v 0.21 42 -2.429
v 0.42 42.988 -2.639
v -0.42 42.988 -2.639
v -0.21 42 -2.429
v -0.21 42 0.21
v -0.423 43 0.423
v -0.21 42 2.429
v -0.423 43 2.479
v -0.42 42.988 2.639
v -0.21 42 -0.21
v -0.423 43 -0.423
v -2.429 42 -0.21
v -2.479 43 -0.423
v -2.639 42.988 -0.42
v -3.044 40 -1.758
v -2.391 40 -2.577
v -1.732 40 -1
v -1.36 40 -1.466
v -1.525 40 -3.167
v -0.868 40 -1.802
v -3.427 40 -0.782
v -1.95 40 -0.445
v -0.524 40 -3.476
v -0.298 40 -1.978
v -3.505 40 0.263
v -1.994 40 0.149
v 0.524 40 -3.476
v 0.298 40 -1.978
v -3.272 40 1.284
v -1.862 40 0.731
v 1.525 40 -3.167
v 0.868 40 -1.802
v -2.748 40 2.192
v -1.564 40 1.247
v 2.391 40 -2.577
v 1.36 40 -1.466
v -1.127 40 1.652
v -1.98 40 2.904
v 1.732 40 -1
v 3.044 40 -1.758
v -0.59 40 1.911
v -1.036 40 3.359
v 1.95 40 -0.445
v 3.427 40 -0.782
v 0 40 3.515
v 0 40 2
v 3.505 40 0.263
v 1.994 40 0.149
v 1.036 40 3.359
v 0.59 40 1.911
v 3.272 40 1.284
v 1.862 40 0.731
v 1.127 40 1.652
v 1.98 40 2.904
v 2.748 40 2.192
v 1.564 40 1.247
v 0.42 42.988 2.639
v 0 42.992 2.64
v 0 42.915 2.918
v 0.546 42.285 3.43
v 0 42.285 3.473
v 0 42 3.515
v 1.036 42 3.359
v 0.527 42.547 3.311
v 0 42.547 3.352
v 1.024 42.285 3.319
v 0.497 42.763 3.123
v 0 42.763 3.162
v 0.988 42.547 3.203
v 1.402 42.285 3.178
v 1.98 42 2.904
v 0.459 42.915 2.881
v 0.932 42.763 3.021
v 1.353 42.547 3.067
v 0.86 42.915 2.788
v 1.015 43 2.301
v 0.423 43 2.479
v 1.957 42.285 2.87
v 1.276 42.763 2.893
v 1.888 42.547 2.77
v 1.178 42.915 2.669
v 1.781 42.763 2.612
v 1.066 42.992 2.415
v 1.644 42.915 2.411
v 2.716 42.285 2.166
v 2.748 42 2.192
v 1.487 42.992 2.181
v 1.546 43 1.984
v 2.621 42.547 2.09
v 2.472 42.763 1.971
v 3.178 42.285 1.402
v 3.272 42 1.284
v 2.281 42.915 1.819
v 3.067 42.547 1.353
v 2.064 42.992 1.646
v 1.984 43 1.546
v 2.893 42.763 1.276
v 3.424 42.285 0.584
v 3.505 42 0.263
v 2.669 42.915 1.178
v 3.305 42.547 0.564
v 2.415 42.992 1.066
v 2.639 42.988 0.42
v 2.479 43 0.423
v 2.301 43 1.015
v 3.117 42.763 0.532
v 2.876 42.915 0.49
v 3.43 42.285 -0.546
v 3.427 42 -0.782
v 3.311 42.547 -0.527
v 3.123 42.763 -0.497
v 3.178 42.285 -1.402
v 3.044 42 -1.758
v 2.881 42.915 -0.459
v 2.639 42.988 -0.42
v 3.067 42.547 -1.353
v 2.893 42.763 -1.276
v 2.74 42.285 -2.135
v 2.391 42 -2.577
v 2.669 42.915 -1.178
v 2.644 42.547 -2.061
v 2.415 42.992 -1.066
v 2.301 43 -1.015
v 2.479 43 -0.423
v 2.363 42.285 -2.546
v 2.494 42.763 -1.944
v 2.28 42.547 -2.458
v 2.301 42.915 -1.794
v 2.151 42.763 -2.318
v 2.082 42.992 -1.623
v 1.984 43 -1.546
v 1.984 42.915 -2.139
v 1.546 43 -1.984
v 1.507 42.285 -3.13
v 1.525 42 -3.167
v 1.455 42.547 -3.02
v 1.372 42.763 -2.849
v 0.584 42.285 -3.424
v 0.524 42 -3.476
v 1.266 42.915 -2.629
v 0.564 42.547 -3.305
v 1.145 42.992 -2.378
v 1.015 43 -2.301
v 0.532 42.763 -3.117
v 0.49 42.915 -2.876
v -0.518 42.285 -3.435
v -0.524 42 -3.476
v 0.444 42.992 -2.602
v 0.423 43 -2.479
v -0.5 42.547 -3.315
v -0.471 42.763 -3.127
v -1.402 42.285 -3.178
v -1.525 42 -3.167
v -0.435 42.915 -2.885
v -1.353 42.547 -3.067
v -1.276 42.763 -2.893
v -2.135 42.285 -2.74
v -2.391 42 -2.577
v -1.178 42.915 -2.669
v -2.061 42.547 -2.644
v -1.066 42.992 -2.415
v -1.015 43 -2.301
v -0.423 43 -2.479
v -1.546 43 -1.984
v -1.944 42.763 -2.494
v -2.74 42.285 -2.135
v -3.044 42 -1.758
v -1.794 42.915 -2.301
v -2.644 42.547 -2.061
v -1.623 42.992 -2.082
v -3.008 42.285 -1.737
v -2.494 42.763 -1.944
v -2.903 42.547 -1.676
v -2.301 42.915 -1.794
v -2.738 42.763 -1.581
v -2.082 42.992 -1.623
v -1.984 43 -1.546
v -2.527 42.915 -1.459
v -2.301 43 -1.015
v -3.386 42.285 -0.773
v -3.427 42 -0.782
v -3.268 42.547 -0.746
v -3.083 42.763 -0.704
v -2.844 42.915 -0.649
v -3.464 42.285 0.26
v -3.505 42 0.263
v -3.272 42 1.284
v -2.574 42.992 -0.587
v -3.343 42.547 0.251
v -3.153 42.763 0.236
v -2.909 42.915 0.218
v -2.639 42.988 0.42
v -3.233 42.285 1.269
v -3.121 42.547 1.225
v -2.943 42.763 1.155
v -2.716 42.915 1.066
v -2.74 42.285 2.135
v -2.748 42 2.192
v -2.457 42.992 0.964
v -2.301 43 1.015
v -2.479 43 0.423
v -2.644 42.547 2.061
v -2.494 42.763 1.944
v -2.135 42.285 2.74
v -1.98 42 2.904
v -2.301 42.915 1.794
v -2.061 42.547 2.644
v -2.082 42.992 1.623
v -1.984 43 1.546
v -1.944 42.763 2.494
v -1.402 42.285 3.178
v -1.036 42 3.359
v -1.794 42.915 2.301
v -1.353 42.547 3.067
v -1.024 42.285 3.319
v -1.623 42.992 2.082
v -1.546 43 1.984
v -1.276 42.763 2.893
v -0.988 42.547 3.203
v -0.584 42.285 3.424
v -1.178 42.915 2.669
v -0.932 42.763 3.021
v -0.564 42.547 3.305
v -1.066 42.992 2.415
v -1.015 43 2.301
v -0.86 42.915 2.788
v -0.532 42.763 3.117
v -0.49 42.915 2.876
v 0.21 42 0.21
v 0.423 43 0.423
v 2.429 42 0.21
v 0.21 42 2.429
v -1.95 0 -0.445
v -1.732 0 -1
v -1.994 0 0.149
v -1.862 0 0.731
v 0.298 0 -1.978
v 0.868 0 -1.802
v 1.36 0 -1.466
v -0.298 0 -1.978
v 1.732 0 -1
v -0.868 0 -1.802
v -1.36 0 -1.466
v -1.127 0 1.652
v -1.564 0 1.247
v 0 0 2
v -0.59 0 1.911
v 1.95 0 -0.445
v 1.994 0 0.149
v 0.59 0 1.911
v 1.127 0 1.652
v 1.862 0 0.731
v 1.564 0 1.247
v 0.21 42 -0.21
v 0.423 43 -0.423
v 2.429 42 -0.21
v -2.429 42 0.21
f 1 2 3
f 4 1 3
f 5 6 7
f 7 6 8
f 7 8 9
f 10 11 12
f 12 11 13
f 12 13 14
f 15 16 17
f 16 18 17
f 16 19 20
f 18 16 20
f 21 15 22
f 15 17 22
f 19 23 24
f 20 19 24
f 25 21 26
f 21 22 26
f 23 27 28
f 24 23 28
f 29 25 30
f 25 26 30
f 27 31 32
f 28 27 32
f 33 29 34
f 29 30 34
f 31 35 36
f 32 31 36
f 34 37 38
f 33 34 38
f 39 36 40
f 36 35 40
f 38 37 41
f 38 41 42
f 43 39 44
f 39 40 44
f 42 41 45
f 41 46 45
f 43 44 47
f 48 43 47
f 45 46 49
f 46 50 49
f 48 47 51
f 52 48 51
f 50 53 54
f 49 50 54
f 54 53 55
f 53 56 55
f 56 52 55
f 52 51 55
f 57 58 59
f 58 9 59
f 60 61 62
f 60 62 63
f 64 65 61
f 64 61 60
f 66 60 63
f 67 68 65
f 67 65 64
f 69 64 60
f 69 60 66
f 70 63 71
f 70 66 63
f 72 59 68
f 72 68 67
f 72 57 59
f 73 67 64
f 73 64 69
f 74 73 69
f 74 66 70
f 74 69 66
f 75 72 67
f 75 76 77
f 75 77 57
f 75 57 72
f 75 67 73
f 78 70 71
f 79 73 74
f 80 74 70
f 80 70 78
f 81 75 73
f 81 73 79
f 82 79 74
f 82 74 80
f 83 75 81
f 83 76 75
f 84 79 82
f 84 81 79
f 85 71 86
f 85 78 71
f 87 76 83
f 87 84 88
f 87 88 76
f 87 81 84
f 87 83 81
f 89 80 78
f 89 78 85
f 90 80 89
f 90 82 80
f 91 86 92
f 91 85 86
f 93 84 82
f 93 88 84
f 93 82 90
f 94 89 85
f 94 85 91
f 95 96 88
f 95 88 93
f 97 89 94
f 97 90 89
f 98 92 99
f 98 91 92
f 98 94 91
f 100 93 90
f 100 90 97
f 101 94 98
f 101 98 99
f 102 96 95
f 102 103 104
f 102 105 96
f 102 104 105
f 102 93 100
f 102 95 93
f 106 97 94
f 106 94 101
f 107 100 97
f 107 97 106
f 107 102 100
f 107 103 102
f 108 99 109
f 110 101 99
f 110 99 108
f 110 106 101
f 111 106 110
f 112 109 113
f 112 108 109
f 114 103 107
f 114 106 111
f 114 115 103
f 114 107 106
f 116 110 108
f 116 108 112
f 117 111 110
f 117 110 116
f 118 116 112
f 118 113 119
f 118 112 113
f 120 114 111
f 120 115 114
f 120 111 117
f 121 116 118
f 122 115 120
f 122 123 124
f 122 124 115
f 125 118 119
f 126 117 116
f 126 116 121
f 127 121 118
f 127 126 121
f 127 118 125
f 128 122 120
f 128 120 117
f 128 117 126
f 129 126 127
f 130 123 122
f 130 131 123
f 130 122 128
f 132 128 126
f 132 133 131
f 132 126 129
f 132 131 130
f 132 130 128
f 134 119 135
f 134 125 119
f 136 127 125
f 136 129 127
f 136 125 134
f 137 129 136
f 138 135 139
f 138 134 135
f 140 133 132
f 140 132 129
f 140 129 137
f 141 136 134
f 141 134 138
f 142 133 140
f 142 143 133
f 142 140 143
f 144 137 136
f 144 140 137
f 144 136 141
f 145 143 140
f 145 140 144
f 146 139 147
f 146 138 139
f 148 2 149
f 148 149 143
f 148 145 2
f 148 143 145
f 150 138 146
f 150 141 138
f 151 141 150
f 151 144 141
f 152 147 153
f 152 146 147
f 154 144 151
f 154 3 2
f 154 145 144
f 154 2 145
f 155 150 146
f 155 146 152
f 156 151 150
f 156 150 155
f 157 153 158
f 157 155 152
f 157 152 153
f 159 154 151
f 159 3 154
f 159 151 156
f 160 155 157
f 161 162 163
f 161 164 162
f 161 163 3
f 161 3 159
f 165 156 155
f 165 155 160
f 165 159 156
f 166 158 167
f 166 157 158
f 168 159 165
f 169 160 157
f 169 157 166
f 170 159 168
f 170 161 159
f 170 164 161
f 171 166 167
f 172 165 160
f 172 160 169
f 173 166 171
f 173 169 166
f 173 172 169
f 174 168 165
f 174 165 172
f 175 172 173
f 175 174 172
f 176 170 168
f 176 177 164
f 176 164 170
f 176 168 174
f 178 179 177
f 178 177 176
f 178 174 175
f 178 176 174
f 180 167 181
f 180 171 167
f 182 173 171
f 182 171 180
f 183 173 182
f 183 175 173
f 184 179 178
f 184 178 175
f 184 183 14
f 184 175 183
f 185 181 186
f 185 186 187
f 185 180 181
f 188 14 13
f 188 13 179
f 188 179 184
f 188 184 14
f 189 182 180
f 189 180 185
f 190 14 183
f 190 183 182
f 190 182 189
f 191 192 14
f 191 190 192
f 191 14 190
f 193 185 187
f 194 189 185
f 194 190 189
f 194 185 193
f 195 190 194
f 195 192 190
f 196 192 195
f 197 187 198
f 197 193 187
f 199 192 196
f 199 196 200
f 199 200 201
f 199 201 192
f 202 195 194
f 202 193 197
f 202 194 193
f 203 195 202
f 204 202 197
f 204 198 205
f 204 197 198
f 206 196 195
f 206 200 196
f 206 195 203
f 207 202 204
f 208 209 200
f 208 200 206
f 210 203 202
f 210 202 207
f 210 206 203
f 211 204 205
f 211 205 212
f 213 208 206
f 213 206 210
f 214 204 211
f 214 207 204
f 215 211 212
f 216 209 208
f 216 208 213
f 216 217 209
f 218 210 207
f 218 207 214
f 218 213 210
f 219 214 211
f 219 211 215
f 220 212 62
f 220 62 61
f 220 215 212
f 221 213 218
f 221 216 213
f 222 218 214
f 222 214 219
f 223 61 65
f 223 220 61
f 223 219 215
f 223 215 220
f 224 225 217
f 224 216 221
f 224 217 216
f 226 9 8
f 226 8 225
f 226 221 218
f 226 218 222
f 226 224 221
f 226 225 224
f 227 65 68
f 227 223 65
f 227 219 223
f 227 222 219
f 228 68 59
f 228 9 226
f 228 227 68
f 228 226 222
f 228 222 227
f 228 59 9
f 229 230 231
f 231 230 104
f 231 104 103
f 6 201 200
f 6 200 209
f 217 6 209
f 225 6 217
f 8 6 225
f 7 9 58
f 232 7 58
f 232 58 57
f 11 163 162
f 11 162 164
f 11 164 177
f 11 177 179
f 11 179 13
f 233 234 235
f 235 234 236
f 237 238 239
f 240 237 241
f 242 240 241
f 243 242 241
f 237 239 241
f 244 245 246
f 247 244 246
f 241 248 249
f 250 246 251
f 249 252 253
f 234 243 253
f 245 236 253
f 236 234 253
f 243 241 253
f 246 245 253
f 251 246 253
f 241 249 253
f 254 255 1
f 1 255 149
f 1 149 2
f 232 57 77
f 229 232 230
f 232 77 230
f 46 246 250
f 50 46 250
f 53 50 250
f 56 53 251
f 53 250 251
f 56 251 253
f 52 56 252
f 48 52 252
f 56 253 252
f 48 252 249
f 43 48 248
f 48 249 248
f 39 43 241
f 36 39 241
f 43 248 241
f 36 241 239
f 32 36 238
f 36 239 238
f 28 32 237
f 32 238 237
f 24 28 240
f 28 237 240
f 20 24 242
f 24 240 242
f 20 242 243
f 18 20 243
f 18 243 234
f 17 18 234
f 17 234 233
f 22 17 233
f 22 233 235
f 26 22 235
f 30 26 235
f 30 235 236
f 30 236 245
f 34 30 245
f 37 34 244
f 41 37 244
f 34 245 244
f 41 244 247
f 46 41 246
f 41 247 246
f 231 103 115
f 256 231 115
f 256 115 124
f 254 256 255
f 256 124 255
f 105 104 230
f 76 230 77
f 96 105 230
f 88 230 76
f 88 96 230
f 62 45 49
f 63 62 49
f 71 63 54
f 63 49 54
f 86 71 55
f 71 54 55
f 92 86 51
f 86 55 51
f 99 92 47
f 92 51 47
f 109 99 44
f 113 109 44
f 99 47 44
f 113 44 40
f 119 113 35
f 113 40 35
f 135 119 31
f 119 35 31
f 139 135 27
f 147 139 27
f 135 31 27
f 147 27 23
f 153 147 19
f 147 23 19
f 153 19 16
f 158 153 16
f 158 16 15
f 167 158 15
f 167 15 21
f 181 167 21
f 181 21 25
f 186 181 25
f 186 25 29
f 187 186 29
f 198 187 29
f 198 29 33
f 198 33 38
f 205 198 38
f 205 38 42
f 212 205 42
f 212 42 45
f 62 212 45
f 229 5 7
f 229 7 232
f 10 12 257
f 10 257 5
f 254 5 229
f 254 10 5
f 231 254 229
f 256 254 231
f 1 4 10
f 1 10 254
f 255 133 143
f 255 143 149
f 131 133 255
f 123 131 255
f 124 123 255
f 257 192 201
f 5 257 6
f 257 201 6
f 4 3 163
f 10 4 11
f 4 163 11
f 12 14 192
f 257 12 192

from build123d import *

# Parameters (mm, degrees)
SKETCH_1_R          = 2
EXTRUDE_1_DEPTH     = 40
SKETCH_2_R          = 3.515
EXTRUDE_2_DEPTH     = 3
CUT_EXTRUDE_1_DEPTH = 1
CUT_EXTRUDE_1_DRAFT = -12
FILLET_2_R          = 1


with BuildPart() as part:
    # Эскиз1 → Бобышка-Вытянуть1 (new body)
    with BuildSketch(Plane(origin=(0, 0, 0), x_dir=(1, 0, 0), z_dir=(0, 1, 0))):
        with Locations(Location((0, 0, 0), (0, 0, 270))):
            Circle(SKETCH_1_R)
    extrude(amount=EXTRUDE_1_DEPTH)

    # Эскиз2 → Бобышка-Вытянуть2 (add)
    with BuildSketch(Plane(origin=(0, 40, 0), x_dir=(1, 0, 0), z_dir=(0, 1, 0))):
        with Locations(Location((0, 0, 0), (0, 0, 270))):
            Circle(SKETCH_2_R)
    extrude(amount=EXTRUDE_2_DEPTH)


with BuildPart() as cut_extrude_1_tool:
    # Эскиз3 → Вырез-Вытянуть1 (with draft: the straight prism first)
    with BuildSketch(Plane(origin=(0, 43, 0), x_dir=(1, 0, 0), z_dir=(0, 1, 0))):
        Polygon((-2.641549473, 0.422769916), (-2.641549473, -0.422769916), (-0.422769916, -0.422769916), (-0.422769916, -2.641549473), (0.422769916, -2.641549473), (0.422769916, -0.422769916), (2.641549473, -0.422769916), (2.641549473, 0.422769916), (0.422769916, 0.422769916), (0.422769916, 2.641549473), (-0.422769916, 2.641549473), (-0.422769916, 0.422769916), align=None)
    extrude(amount=-CUT_EXTRUDE_1_DEPTH)
    # Вырез-Вытянуть1: the draft: its side faces are tilted about the plane it starts from
    cut_extrude_1_sides = [cut_extrude_1_tool.faces().sort_by_distance(p)[0] for p in [
        (-2.641549473, 42.5, 0),
        (-1.532159694, 42.5, 0.422769916),
        (-0.422769916, 42.5, 1.532159694),
        (0, 42.5, 2.641549473),
        (0.422769916, 42.5, 1.532159694),
        (1.532159694, 42.5, 0.422769916),
        (2.641549473, 42.5, 0),
        (1.532159694, 42.5, -0.422769916),
        (0.422769916, 42.5, -1.532159694),
        (0, 42.5, -2.641549473),
        (-0.422769916, 42.5, -1.532159694),
        (-1.532159694, 42.5, -0.422769916),
    ]]
    draft(cut_extrude_1_sides, Plane(origin=(0, 43, 0), x_dir=(1, 0, 0), z_dir=(0, 1, 0)), CUT_EXTRUDE_1_DRAFT)


with BuildPart() as part_1:
    add(part.part)

    # Вырез-Вытянуть1: cut by cut_extrude_1_tool
    add(cut_extrude_1_tool.part, mode=Mode.SUBTRACT)

    # Скругление2
    # the kernel refuses this fillet: 1 mm, written as the material it takes off along each edge
    with BuildSketch(Plane(origin=(0, 43, 0), x_dir=(0, 0, 1), z_dir=(-1, 0, 0))) as fillet_2_piece_1:
        with BuildLine():
            CenterArc((3.515 - FILLET_2_R, -FILLET_2_R), FILLET_2_R, 0, 90)
            Line((3.515 - FILLET_2_R, 0), (3.515, 0))
            Line((3.515, 0), (3.515, -FILLET_2_R))
        make_face()
    revolve(axis=Axis((0, 43, 0), (0, 1, 0)), mode=Mode.SUBTRACT)


solid = part_1.part
